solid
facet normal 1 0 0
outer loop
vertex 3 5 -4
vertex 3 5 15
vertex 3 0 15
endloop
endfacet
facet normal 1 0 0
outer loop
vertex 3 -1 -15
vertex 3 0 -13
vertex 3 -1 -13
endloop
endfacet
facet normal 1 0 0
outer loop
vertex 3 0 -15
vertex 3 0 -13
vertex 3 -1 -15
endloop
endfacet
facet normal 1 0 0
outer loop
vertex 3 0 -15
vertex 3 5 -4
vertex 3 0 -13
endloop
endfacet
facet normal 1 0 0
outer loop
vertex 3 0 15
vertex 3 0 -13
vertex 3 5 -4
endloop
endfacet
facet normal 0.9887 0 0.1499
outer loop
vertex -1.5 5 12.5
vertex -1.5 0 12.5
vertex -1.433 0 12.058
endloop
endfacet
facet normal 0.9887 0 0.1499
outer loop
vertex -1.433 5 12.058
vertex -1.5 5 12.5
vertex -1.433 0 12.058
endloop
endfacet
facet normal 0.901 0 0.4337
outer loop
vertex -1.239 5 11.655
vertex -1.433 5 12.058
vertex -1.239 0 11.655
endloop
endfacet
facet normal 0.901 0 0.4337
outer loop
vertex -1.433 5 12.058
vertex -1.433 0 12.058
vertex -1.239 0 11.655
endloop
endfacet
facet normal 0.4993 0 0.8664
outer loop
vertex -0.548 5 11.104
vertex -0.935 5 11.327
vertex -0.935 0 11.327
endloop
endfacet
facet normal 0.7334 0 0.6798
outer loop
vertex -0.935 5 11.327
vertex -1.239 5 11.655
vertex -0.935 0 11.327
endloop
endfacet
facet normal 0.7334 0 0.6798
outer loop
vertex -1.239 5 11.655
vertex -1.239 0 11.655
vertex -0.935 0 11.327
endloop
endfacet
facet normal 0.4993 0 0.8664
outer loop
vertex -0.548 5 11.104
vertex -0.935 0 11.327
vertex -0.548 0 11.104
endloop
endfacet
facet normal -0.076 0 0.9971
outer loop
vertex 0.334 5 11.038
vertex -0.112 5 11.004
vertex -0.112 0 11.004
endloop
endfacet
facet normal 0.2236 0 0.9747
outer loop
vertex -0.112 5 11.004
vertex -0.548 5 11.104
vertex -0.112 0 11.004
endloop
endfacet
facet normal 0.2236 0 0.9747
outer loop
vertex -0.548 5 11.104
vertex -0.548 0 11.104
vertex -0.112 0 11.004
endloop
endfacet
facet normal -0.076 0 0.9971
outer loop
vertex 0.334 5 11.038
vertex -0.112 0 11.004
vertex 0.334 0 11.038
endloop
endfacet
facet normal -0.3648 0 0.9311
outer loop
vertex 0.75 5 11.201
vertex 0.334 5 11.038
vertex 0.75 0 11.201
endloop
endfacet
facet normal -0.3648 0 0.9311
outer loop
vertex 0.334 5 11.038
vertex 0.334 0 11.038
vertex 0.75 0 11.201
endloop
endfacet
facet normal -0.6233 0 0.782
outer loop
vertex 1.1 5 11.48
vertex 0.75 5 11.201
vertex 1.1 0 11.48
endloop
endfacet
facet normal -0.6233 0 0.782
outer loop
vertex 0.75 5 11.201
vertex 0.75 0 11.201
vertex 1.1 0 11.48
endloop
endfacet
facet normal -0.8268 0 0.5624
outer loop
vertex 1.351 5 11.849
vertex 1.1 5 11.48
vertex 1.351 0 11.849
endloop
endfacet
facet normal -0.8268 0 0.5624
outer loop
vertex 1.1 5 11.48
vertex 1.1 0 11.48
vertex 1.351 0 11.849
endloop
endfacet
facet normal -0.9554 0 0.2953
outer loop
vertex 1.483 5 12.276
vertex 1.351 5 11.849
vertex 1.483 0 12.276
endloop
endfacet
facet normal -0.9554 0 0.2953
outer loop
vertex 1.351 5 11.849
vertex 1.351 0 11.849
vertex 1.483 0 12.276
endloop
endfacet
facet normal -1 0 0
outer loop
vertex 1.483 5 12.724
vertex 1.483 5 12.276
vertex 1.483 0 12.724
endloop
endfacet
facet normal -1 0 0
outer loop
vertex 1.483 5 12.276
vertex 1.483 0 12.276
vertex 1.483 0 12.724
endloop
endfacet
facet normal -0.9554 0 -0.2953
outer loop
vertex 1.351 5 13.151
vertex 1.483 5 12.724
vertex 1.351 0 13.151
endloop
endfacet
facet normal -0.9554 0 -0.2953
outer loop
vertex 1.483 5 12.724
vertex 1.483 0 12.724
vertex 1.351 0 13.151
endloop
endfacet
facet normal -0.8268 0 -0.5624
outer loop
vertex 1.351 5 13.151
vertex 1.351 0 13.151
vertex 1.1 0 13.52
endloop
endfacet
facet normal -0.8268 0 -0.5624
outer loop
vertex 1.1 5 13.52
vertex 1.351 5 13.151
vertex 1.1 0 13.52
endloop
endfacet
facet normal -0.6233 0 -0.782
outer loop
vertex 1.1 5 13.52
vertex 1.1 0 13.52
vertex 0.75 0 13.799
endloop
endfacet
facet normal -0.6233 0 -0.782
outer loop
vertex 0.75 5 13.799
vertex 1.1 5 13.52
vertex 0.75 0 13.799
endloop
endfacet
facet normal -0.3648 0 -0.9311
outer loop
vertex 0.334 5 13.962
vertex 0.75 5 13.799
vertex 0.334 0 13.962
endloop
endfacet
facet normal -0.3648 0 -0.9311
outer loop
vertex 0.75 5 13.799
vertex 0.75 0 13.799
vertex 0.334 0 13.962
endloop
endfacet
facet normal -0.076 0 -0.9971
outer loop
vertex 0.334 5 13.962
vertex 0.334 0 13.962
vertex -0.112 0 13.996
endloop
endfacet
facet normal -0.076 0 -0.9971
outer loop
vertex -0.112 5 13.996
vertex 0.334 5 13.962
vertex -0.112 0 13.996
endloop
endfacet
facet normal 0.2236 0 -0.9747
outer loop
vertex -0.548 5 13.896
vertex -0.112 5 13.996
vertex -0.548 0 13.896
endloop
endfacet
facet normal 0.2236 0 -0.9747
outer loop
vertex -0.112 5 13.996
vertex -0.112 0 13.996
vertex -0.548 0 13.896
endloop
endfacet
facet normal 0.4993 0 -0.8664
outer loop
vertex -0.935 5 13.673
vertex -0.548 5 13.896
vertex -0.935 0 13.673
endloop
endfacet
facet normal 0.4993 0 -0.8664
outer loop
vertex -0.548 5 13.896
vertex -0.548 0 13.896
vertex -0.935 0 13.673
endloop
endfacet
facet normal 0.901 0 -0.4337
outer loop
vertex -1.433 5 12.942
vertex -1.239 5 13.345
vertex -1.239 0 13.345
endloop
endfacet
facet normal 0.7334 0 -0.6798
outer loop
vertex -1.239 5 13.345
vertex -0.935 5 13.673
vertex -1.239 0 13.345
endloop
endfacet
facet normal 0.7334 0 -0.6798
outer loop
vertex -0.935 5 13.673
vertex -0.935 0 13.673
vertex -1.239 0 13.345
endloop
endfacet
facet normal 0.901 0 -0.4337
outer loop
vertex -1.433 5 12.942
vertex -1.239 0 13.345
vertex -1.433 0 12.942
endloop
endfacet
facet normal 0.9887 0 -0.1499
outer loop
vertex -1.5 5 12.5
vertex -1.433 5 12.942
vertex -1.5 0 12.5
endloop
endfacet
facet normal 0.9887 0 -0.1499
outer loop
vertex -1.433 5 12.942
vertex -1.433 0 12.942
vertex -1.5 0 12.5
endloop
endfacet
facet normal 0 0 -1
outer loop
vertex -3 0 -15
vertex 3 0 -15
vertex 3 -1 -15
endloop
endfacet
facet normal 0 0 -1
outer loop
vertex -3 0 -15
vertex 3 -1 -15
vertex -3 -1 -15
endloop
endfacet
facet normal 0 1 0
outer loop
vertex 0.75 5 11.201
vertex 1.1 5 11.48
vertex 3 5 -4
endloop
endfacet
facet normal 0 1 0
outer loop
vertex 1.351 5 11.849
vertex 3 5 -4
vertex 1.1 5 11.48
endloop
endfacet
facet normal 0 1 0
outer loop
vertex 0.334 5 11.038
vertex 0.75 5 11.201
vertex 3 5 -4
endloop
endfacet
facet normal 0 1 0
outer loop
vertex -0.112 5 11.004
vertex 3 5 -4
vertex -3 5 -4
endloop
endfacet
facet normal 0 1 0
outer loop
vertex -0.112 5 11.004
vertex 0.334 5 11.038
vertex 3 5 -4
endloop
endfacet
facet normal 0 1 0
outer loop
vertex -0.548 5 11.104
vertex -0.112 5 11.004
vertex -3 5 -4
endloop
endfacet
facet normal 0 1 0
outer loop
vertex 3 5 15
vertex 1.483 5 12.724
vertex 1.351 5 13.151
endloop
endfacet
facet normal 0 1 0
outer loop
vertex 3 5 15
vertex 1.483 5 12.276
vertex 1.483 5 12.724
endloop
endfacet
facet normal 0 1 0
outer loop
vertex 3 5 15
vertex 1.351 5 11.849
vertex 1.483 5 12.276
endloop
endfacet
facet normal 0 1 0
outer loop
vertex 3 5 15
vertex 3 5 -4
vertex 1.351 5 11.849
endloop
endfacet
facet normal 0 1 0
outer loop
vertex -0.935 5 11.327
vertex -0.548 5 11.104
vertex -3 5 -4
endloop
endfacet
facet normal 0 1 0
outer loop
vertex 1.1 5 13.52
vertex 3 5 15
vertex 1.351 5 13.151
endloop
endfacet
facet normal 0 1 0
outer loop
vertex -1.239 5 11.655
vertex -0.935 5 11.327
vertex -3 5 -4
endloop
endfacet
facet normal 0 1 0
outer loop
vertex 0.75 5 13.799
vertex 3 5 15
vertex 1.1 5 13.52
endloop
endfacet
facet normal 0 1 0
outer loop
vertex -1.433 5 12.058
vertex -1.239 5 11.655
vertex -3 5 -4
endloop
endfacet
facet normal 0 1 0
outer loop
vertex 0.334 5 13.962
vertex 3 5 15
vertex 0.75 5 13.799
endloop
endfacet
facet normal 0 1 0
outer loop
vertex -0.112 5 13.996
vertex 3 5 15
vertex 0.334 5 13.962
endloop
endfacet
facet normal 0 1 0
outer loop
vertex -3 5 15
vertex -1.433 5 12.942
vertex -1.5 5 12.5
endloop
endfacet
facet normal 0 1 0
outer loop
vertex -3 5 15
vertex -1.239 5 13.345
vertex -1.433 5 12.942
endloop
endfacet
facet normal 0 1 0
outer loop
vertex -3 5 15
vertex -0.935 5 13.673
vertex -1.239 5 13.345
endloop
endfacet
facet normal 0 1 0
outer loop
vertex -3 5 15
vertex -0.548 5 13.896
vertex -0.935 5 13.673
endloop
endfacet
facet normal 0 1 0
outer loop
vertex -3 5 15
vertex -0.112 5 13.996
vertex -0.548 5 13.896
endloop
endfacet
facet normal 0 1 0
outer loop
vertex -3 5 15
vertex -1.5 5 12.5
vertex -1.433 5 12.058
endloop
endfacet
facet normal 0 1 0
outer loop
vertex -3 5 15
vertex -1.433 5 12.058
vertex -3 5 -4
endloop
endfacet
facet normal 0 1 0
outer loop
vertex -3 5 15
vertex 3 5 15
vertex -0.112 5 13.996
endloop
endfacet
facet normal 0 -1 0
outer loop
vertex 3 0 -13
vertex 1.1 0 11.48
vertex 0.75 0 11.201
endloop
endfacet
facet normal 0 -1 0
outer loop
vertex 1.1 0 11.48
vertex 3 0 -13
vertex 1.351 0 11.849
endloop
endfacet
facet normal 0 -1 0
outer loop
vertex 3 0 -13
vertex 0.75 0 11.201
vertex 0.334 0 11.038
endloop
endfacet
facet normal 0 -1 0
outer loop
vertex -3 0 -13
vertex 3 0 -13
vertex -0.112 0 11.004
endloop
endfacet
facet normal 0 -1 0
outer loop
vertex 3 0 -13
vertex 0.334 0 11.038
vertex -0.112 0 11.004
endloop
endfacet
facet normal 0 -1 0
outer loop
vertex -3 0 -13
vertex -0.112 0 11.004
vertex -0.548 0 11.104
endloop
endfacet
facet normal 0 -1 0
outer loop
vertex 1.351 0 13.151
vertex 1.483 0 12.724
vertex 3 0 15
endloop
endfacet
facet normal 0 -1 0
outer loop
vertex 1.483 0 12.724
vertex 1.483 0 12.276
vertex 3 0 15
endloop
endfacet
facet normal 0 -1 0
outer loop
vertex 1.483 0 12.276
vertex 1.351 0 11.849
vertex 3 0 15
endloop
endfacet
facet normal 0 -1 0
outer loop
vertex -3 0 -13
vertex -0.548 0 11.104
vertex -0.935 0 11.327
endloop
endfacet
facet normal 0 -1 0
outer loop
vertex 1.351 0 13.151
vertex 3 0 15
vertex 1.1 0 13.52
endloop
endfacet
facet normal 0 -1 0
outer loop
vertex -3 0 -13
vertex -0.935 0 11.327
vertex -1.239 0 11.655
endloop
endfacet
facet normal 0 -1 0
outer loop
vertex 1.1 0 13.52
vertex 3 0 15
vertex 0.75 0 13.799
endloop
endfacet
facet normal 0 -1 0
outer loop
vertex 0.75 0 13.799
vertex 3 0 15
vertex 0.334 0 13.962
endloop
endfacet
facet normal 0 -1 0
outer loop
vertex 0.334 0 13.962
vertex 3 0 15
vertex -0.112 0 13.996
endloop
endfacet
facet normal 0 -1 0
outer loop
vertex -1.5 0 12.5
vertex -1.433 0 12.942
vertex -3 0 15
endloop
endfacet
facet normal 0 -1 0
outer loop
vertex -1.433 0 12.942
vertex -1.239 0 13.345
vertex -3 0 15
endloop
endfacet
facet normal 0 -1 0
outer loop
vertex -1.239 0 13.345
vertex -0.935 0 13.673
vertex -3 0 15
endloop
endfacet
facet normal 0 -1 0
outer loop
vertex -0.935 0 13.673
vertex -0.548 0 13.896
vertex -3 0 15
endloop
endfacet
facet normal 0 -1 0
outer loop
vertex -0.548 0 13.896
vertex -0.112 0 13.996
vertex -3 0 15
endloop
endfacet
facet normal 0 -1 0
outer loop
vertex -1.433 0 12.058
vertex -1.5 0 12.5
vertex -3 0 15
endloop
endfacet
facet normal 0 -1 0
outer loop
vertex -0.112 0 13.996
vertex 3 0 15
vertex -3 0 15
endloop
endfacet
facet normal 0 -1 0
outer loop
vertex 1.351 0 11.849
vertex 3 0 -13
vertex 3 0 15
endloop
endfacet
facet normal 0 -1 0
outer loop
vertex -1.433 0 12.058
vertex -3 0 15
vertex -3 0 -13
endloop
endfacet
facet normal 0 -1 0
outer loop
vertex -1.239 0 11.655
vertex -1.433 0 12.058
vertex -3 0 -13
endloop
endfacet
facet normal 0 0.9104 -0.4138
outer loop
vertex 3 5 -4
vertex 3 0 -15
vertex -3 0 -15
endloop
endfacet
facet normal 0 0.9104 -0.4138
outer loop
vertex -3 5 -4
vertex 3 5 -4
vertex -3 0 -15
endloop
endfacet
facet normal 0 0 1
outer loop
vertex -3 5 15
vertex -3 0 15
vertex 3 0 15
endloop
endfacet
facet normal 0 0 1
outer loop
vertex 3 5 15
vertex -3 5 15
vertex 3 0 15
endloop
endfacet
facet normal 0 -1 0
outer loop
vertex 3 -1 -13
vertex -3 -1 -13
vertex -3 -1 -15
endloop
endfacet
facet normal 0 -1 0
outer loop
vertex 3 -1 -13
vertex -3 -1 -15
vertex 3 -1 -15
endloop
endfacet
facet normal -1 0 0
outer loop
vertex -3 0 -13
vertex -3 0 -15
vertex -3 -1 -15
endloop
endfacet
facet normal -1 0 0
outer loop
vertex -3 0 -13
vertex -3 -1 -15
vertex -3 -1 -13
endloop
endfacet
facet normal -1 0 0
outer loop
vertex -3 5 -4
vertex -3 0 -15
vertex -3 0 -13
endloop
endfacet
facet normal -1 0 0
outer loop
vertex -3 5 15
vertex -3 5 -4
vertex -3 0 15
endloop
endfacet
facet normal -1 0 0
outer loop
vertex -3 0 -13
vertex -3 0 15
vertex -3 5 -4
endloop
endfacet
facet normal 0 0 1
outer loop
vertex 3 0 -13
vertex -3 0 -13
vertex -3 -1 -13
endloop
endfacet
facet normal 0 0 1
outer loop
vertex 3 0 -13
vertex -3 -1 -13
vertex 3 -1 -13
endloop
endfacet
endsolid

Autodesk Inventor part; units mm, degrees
ref_plane "YZ Plane" through (0, 0, 0) normal (1, 0, 0) x (0, 1, 0)
ref_plane "XZ Plane" through (0, 0, 0) normal (0, 1, 0) x (-1, 0, 0)
ref_plane "XY Plane" through (0, 0, 0) normal (0, 0, 1) x (1, 0, 0)
sketch "Boceto1" plane through (0, 0, 0) normal (0, 1, 0) x (-1, 0, 0)
  line L0 (-3, -15) -> (3, -15)
  line L1 (3, -15) -> (3, 15)
  line L2 (3, 15) -> (-3, 15)
  line L3 (-3, 15) -> (-3, -15)
  line L4 (-3, -15) -> (3, 15) construction
  line L5 (3, -15) -> (-3, 15) construction
  circle A0 centre (0, 12.5) radius 1.5
  point P0 (0, 0)
  point P1 (0, 15)
  dimension "d0" = 6
  dimension "d1" = 30
  dimension "d3" = 3
  dimension "d12" = 2.5
extrude "Extrusión1" add sketch "Boceto1" along normal blind 5
chamfer "Chaflán1" distance 11 distance2 5 1 edges at (0, 5, -15) measured on face at (-0.0603, 5, -6.3297)
sketch "Boceto2" plane through (0, 0, 0) normal (0, -1, 0) x (1, 0, 0)
  line L0 (3, 15) -> (3, -15) projected
  line L1 (-3, -15) -> (-3, 15) projected
  line L2 (3, -15) -> (-3, -15)
  line L3 (-3, -15) -> (-3, -13)
  line L4 (-3, -13) -> (3, -13)
  line L5 (3, -13) -> (3, -15)
  point P0 (0, 0)
  point P1 (-3, -15)
  point P2 (3, -13)
  dimension "d9" = 2
extrude "Extrusión2" add sketch "Boceto2" along normal blind 1
properties part number "Soporte PCB pieza plastico"
